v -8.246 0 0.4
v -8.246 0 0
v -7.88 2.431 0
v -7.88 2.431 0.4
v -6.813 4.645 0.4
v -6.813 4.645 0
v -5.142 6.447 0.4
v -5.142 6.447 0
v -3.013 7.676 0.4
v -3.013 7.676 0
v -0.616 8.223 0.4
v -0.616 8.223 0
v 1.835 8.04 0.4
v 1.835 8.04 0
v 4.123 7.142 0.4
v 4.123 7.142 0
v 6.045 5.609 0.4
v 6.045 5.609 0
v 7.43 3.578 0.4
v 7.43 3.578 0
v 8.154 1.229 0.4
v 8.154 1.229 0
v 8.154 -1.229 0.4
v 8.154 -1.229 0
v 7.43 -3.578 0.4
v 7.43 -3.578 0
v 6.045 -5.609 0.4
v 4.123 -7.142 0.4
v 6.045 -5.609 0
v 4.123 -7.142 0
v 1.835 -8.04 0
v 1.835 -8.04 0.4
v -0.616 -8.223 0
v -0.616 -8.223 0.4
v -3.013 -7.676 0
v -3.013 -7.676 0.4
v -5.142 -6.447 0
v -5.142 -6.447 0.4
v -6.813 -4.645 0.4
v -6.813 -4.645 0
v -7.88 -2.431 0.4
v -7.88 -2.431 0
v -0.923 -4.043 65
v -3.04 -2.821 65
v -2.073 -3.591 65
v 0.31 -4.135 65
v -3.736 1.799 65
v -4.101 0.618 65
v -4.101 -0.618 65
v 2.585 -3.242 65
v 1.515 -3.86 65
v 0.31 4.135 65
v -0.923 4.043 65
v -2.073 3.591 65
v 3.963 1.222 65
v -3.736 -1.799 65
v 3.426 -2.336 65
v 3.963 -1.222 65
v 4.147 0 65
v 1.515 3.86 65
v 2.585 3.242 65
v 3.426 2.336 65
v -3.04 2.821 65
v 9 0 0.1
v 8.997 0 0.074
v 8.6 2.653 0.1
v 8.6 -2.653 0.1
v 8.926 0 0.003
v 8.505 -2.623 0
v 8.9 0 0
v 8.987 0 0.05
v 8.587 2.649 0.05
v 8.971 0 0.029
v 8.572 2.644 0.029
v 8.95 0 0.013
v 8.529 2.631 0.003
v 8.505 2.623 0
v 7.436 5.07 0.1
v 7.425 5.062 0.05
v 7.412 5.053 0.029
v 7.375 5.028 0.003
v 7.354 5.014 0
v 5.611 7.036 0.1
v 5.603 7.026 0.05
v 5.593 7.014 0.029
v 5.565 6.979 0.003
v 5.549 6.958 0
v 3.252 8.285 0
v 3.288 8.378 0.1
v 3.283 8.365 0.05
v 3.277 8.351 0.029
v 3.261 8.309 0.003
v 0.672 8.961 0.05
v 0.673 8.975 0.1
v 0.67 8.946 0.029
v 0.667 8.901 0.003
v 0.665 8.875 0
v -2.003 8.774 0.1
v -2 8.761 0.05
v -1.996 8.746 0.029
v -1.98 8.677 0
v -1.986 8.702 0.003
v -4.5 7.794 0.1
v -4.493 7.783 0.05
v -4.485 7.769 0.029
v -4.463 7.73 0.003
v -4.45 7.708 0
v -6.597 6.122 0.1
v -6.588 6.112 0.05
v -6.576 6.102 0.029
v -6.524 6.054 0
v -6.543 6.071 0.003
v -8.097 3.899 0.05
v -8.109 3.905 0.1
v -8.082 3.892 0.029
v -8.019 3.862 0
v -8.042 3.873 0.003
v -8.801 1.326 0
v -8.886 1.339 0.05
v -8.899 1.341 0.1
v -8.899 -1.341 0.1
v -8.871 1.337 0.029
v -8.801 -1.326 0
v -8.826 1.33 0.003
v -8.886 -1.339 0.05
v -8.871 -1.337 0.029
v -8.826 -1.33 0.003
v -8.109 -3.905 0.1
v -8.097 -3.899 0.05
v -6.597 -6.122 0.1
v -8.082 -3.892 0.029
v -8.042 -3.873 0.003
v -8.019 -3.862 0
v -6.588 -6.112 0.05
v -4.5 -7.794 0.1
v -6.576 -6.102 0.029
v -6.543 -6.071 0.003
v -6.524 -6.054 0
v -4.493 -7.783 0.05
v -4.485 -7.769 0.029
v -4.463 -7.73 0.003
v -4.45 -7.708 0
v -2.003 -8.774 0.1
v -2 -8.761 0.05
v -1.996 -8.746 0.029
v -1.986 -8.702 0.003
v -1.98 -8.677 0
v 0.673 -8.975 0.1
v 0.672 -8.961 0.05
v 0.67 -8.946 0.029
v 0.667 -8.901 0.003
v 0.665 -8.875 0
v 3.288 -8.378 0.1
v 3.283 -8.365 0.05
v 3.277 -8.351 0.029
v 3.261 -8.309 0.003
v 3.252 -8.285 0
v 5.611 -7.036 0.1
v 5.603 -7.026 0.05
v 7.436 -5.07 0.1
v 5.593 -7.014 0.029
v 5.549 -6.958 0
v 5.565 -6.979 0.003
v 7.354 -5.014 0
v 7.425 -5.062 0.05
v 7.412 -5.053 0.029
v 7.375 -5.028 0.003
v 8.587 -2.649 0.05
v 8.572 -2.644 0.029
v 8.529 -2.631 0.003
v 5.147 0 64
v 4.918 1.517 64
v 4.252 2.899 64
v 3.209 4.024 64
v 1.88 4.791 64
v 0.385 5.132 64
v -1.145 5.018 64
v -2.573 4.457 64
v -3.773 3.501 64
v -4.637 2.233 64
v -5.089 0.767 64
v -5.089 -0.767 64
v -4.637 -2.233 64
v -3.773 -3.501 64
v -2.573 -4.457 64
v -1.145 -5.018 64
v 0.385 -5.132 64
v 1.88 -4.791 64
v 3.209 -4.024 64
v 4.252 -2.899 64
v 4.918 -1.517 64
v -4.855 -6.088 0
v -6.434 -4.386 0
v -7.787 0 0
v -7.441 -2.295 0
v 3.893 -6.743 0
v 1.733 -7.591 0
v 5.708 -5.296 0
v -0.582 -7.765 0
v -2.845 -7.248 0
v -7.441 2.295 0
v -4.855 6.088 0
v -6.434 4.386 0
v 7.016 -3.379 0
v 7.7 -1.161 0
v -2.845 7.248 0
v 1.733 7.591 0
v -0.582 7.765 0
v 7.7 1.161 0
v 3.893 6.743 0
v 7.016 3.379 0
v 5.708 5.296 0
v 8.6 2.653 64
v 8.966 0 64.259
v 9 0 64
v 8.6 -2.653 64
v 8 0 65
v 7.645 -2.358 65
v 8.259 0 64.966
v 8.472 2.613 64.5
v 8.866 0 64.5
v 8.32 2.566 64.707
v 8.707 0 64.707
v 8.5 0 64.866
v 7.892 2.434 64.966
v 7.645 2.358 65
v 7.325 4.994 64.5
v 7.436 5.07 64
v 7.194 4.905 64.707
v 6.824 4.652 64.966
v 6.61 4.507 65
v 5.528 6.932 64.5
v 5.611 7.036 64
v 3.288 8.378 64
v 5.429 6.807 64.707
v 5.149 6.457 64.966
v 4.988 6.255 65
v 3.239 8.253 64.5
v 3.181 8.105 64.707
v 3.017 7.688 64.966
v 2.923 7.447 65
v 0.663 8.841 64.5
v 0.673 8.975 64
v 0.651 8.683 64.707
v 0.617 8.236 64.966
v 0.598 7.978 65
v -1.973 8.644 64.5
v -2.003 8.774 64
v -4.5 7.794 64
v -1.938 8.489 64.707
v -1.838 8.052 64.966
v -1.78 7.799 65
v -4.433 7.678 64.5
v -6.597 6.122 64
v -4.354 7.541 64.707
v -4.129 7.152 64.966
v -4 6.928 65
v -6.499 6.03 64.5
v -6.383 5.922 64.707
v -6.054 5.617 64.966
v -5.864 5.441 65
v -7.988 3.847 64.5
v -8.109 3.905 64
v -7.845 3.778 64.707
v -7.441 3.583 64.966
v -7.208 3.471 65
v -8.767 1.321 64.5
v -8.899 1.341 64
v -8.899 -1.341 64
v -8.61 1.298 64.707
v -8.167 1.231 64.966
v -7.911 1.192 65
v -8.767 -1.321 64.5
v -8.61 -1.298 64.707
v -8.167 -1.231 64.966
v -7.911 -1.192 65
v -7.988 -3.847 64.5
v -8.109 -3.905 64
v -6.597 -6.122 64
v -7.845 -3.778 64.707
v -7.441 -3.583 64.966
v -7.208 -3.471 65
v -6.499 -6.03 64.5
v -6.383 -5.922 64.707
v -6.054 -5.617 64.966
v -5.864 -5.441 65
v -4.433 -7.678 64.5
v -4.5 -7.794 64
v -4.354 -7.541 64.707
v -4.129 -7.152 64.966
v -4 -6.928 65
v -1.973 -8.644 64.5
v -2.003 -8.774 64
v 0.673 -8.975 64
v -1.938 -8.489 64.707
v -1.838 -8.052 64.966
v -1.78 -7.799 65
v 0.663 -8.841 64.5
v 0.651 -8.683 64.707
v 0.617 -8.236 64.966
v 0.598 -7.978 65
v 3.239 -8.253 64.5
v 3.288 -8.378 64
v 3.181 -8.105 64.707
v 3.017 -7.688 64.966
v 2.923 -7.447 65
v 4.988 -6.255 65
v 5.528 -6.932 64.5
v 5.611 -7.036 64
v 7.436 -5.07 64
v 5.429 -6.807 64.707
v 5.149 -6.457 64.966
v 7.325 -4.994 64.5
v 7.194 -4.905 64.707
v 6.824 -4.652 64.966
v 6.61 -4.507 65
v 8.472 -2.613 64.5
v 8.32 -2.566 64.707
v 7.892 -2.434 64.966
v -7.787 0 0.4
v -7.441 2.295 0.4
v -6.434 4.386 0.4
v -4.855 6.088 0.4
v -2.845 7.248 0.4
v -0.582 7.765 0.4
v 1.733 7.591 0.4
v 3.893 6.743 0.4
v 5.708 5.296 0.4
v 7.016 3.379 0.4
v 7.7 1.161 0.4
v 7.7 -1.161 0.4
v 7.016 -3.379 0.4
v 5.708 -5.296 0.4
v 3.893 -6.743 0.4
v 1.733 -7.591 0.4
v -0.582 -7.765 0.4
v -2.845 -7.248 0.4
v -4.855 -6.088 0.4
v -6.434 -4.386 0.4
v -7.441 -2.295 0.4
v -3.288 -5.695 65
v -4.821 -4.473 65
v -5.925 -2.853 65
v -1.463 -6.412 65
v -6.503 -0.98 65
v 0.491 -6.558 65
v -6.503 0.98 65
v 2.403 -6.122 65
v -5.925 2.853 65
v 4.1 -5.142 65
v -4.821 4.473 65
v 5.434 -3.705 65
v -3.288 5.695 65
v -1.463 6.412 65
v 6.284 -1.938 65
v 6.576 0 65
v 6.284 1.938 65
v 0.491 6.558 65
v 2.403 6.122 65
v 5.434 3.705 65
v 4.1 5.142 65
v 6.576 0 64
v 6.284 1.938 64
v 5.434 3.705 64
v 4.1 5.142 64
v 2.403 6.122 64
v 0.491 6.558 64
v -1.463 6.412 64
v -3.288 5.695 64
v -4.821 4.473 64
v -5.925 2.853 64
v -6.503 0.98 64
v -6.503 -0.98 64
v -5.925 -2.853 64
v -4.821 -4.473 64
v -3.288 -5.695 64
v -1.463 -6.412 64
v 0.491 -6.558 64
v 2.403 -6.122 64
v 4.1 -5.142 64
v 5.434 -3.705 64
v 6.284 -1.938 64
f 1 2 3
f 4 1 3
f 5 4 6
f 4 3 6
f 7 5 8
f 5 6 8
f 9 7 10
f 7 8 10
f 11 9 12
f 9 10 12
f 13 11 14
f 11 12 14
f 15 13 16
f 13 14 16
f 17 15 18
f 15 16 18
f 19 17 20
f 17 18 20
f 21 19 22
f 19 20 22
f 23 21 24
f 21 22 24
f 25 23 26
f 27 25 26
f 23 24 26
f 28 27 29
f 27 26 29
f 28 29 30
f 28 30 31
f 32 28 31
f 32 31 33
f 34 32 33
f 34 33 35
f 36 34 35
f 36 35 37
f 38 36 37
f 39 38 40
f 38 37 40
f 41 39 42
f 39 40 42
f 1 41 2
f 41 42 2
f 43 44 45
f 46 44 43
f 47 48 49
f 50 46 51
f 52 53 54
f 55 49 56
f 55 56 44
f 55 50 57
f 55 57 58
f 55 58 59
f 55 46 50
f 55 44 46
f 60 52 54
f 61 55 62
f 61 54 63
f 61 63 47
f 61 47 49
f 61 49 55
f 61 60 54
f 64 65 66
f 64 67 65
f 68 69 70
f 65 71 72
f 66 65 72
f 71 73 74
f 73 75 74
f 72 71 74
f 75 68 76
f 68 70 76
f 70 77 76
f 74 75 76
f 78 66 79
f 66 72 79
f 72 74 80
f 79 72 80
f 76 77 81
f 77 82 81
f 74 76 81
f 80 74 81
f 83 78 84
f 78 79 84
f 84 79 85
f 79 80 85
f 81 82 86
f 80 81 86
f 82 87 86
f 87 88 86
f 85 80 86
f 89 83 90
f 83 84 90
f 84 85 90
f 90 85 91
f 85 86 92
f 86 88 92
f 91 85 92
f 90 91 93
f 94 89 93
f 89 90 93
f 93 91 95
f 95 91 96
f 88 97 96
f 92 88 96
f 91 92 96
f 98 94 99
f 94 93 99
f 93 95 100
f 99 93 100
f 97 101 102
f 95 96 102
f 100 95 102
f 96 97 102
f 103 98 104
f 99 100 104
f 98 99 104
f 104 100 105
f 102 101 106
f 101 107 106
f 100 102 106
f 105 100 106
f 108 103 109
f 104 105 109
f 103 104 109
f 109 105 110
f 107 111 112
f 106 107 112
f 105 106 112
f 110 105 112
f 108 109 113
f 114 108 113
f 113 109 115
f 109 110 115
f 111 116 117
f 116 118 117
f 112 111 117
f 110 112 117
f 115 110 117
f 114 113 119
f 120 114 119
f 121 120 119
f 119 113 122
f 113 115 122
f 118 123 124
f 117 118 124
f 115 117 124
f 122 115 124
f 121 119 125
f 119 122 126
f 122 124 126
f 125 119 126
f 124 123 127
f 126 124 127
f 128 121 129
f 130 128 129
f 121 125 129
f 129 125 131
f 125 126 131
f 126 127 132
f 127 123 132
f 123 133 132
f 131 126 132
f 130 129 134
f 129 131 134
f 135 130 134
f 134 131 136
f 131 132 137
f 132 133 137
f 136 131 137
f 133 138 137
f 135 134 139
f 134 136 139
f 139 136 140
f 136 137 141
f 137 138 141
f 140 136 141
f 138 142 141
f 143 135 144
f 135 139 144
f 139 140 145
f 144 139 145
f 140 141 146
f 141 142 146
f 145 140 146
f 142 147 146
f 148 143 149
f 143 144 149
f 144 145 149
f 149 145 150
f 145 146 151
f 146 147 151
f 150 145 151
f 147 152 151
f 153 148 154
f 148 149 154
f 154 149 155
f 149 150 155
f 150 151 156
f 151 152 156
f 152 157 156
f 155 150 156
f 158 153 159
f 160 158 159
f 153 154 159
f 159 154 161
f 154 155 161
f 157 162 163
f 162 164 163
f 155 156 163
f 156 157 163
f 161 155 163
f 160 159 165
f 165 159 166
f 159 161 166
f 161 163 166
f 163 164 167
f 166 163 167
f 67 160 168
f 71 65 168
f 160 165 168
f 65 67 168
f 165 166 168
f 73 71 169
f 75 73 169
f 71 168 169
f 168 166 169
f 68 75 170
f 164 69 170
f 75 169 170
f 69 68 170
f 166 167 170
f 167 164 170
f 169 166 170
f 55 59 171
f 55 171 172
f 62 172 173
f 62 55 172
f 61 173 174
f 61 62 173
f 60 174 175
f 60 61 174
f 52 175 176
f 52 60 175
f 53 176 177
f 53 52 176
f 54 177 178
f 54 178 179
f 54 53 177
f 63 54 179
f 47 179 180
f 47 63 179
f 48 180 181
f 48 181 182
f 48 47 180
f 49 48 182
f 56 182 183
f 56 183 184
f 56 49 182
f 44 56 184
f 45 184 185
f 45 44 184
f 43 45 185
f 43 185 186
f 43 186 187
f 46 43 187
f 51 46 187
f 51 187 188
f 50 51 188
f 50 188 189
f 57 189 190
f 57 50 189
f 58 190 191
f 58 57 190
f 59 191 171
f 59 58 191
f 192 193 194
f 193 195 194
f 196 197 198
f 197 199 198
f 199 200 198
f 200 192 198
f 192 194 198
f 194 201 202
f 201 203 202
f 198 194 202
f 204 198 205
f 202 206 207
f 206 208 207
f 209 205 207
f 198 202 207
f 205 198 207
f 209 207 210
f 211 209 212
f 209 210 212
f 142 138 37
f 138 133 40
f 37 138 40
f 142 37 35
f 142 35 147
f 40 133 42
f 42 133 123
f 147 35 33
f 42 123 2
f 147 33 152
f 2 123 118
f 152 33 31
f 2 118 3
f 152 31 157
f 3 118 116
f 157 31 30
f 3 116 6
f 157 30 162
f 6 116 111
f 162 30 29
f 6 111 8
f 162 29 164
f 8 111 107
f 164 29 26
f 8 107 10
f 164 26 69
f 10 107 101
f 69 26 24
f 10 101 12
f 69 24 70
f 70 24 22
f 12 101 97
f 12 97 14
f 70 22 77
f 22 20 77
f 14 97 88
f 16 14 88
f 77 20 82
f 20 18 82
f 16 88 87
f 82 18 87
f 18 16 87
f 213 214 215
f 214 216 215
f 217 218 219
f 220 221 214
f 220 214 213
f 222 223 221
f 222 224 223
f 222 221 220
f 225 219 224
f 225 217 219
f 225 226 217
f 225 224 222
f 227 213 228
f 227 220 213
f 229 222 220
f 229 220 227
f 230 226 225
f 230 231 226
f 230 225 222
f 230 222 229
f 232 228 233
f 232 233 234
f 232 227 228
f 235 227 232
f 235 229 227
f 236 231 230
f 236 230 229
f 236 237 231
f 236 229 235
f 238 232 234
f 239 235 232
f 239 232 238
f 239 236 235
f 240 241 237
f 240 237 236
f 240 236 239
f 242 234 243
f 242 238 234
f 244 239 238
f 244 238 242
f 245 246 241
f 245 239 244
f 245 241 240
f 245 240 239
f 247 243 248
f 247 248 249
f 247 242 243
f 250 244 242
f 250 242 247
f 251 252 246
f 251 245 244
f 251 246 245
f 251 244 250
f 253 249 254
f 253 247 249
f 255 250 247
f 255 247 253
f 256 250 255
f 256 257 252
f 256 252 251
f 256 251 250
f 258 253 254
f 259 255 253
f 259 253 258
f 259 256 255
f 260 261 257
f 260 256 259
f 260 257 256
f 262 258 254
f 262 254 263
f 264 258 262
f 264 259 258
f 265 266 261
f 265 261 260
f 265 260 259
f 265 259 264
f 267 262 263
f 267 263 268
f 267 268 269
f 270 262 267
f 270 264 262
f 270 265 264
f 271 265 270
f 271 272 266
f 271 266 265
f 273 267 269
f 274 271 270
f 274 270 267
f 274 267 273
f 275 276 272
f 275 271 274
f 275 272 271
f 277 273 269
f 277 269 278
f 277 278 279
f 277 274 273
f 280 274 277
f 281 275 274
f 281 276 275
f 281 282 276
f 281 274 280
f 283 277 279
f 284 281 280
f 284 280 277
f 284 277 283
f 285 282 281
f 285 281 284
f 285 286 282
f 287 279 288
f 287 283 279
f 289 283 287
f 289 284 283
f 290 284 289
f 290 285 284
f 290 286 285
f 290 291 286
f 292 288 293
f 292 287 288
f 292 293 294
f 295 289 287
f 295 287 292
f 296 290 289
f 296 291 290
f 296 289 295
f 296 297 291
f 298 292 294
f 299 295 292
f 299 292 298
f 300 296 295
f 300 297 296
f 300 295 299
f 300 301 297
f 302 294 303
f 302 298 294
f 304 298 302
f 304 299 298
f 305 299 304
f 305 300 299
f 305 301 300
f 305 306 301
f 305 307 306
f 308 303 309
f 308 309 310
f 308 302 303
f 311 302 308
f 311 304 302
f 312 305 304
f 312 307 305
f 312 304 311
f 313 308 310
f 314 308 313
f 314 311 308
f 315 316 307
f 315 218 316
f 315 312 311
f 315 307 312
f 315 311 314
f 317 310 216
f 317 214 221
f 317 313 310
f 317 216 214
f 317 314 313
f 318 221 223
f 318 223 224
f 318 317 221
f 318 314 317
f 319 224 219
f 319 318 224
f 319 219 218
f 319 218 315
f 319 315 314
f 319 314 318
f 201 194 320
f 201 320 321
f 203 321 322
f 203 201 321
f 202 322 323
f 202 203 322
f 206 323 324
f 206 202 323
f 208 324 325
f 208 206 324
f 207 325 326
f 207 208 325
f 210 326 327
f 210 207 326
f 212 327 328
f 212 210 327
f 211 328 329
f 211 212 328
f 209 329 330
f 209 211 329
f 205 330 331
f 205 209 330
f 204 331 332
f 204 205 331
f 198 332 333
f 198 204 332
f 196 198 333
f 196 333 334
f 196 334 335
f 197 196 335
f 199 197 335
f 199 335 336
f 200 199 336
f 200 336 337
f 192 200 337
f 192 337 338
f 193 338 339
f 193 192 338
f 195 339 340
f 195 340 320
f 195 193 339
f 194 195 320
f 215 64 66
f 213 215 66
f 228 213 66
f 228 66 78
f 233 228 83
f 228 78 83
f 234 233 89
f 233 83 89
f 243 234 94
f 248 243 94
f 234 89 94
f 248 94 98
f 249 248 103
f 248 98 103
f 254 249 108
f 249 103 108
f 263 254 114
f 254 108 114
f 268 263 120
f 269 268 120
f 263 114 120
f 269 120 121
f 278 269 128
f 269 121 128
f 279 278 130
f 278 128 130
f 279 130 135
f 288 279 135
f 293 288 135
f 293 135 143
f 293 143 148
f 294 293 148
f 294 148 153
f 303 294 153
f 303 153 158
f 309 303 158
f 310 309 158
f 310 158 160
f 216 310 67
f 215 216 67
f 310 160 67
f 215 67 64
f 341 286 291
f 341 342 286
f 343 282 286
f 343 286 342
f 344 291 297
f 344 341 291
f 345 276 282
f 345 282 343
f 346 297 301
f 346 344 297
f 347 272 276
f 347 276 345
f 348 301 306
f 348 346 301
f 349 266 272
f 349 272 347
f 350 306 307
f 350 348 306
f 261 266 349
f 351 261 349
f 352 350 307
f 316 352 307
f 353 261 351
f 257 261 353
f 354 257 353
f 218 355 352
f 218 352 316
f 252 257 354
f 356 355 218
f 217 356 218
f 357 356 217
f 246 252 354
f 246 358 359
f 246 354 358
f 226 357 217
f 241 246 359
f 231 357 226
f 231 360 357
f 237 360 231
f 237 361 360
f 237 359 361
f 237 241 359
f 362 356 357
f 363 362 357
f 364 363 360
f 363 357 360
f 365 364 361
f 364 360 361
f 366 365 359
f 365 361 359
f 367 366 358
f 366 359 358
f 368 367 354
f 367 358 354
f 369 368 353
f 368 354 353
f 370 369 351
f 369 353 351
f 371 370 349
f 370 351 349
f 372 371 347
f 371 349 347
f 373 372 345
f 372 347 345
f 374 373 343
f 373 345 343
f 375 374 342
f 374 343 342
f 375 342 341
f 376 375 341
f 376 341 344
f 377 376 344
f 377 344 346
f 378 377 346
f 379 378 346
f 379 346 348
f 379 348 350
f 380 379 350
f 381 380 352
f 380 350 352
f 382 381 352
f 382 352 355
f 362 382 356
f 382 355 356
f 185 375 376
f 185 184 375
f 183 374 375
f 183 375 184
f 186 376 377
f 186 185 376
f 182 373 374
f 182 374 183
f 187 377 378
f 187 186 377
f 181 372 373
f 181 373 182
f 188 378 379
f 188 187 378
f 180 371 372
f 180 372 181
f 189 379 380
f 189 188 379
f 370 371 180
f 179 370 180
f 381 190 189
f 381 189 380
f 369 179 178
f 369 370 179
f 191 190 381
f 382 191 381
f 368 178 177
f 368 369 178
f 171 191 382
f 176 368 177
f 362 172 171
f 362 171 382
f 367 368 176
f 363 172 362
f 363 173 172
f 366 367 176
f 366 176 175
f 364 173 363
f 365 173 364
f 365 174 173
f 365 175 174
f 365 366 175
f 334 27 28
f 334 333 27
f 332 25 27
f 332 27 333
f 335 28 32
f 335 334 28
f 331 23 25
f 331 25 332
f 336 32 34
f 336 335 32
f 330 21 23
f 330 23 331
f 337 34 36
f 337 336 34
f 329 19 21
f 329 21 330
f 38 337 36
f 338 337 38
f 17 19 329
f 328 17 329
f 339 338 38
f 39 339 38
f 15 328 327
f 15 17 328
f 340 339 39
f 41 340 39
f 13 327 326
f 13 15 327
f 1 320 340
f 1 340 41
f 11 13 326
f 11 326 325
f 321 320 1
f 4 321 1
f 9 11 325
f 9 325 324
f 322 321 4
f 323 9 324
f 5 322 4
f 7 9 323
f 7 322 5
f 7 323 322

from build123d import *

# Parameters (mm, degrees)
SKETCH1_R           = 9
BOSS_EXTRUDE1_DEPTH = 65
SKETCH2_R           = 6.576456623
SKETCH2_R_2         = 5.146719103
CUT_EXTRUDE2_DEPTH  = 1
FILLET1_R           = 1
CHAMFER1_SIZE       = 1
SKETCH3_R           = 8.24633038
SKETCH3_R_2         = 7.786680871
CUT_EXTRUDE3_DEPTH  = 0.4
FILLET2_R           = 0.1


with BuildPart() as part:
    # Sketch1 → Boss-Extrude1 (new body)
    with BuildSketch(Plane.XY):
        Circle(SKETCH1_R)
    extrude(amount=BOSS_EXTRUDE1_DEPTH)

    # Sketch2 → Cut-Extrude2 (cut)
    with BuildSketch(Plane.XY.offset(65)):
        Circle(SKETCH2_R)
        Circle(SKETCH2_R_2, mode=Mode.SUBTRACT)
    extrude(amount=-CUT_EXTRUDE2_DEPTH, mode=Mode.SUBTRACT)

    # Fillet1
    fillet1_edges = [part.edges().sort_by_distance(p)[0] for p in [
        (-9, 0, 65),
    ]]
    fillet(fillet1_edges, radius=FILLET1_R)

    # Chamfer1
    chamfer1_edges = [part.edges().sort_by_distance(p)[0] for p in [
        (-5.146719103, 0, 65),
    ]]
    chamfer(chamfer1_edges, length=CHAMFER1_SIZE - 0.0001)  # a hair under: the kernel refuses the full size

    # Sketch3 → Cut-Extrude3 (cut)
    with BuildSketch(Plane(origin=(0, 0, 0), x_dir=(-1, 0, 0), z_dir=(0, 0, -1))):
        Circle(SKETCH3_R)
        Circle(SKETCH3_R_2, mode=Mode.SUBTRACT)
    extrude(amount=-CUT_EXTRUDE3_DEPTH, mode=Mode.SUBTRACT)

    # Fillet2
    fillet2_edges = [part.edges().sort_by_distance(p)[0] for p in [
        (-9, 0, 0),
    ]]
    fillet(fillet2_edges, radius=FILLET2_R)


solid = part.part
